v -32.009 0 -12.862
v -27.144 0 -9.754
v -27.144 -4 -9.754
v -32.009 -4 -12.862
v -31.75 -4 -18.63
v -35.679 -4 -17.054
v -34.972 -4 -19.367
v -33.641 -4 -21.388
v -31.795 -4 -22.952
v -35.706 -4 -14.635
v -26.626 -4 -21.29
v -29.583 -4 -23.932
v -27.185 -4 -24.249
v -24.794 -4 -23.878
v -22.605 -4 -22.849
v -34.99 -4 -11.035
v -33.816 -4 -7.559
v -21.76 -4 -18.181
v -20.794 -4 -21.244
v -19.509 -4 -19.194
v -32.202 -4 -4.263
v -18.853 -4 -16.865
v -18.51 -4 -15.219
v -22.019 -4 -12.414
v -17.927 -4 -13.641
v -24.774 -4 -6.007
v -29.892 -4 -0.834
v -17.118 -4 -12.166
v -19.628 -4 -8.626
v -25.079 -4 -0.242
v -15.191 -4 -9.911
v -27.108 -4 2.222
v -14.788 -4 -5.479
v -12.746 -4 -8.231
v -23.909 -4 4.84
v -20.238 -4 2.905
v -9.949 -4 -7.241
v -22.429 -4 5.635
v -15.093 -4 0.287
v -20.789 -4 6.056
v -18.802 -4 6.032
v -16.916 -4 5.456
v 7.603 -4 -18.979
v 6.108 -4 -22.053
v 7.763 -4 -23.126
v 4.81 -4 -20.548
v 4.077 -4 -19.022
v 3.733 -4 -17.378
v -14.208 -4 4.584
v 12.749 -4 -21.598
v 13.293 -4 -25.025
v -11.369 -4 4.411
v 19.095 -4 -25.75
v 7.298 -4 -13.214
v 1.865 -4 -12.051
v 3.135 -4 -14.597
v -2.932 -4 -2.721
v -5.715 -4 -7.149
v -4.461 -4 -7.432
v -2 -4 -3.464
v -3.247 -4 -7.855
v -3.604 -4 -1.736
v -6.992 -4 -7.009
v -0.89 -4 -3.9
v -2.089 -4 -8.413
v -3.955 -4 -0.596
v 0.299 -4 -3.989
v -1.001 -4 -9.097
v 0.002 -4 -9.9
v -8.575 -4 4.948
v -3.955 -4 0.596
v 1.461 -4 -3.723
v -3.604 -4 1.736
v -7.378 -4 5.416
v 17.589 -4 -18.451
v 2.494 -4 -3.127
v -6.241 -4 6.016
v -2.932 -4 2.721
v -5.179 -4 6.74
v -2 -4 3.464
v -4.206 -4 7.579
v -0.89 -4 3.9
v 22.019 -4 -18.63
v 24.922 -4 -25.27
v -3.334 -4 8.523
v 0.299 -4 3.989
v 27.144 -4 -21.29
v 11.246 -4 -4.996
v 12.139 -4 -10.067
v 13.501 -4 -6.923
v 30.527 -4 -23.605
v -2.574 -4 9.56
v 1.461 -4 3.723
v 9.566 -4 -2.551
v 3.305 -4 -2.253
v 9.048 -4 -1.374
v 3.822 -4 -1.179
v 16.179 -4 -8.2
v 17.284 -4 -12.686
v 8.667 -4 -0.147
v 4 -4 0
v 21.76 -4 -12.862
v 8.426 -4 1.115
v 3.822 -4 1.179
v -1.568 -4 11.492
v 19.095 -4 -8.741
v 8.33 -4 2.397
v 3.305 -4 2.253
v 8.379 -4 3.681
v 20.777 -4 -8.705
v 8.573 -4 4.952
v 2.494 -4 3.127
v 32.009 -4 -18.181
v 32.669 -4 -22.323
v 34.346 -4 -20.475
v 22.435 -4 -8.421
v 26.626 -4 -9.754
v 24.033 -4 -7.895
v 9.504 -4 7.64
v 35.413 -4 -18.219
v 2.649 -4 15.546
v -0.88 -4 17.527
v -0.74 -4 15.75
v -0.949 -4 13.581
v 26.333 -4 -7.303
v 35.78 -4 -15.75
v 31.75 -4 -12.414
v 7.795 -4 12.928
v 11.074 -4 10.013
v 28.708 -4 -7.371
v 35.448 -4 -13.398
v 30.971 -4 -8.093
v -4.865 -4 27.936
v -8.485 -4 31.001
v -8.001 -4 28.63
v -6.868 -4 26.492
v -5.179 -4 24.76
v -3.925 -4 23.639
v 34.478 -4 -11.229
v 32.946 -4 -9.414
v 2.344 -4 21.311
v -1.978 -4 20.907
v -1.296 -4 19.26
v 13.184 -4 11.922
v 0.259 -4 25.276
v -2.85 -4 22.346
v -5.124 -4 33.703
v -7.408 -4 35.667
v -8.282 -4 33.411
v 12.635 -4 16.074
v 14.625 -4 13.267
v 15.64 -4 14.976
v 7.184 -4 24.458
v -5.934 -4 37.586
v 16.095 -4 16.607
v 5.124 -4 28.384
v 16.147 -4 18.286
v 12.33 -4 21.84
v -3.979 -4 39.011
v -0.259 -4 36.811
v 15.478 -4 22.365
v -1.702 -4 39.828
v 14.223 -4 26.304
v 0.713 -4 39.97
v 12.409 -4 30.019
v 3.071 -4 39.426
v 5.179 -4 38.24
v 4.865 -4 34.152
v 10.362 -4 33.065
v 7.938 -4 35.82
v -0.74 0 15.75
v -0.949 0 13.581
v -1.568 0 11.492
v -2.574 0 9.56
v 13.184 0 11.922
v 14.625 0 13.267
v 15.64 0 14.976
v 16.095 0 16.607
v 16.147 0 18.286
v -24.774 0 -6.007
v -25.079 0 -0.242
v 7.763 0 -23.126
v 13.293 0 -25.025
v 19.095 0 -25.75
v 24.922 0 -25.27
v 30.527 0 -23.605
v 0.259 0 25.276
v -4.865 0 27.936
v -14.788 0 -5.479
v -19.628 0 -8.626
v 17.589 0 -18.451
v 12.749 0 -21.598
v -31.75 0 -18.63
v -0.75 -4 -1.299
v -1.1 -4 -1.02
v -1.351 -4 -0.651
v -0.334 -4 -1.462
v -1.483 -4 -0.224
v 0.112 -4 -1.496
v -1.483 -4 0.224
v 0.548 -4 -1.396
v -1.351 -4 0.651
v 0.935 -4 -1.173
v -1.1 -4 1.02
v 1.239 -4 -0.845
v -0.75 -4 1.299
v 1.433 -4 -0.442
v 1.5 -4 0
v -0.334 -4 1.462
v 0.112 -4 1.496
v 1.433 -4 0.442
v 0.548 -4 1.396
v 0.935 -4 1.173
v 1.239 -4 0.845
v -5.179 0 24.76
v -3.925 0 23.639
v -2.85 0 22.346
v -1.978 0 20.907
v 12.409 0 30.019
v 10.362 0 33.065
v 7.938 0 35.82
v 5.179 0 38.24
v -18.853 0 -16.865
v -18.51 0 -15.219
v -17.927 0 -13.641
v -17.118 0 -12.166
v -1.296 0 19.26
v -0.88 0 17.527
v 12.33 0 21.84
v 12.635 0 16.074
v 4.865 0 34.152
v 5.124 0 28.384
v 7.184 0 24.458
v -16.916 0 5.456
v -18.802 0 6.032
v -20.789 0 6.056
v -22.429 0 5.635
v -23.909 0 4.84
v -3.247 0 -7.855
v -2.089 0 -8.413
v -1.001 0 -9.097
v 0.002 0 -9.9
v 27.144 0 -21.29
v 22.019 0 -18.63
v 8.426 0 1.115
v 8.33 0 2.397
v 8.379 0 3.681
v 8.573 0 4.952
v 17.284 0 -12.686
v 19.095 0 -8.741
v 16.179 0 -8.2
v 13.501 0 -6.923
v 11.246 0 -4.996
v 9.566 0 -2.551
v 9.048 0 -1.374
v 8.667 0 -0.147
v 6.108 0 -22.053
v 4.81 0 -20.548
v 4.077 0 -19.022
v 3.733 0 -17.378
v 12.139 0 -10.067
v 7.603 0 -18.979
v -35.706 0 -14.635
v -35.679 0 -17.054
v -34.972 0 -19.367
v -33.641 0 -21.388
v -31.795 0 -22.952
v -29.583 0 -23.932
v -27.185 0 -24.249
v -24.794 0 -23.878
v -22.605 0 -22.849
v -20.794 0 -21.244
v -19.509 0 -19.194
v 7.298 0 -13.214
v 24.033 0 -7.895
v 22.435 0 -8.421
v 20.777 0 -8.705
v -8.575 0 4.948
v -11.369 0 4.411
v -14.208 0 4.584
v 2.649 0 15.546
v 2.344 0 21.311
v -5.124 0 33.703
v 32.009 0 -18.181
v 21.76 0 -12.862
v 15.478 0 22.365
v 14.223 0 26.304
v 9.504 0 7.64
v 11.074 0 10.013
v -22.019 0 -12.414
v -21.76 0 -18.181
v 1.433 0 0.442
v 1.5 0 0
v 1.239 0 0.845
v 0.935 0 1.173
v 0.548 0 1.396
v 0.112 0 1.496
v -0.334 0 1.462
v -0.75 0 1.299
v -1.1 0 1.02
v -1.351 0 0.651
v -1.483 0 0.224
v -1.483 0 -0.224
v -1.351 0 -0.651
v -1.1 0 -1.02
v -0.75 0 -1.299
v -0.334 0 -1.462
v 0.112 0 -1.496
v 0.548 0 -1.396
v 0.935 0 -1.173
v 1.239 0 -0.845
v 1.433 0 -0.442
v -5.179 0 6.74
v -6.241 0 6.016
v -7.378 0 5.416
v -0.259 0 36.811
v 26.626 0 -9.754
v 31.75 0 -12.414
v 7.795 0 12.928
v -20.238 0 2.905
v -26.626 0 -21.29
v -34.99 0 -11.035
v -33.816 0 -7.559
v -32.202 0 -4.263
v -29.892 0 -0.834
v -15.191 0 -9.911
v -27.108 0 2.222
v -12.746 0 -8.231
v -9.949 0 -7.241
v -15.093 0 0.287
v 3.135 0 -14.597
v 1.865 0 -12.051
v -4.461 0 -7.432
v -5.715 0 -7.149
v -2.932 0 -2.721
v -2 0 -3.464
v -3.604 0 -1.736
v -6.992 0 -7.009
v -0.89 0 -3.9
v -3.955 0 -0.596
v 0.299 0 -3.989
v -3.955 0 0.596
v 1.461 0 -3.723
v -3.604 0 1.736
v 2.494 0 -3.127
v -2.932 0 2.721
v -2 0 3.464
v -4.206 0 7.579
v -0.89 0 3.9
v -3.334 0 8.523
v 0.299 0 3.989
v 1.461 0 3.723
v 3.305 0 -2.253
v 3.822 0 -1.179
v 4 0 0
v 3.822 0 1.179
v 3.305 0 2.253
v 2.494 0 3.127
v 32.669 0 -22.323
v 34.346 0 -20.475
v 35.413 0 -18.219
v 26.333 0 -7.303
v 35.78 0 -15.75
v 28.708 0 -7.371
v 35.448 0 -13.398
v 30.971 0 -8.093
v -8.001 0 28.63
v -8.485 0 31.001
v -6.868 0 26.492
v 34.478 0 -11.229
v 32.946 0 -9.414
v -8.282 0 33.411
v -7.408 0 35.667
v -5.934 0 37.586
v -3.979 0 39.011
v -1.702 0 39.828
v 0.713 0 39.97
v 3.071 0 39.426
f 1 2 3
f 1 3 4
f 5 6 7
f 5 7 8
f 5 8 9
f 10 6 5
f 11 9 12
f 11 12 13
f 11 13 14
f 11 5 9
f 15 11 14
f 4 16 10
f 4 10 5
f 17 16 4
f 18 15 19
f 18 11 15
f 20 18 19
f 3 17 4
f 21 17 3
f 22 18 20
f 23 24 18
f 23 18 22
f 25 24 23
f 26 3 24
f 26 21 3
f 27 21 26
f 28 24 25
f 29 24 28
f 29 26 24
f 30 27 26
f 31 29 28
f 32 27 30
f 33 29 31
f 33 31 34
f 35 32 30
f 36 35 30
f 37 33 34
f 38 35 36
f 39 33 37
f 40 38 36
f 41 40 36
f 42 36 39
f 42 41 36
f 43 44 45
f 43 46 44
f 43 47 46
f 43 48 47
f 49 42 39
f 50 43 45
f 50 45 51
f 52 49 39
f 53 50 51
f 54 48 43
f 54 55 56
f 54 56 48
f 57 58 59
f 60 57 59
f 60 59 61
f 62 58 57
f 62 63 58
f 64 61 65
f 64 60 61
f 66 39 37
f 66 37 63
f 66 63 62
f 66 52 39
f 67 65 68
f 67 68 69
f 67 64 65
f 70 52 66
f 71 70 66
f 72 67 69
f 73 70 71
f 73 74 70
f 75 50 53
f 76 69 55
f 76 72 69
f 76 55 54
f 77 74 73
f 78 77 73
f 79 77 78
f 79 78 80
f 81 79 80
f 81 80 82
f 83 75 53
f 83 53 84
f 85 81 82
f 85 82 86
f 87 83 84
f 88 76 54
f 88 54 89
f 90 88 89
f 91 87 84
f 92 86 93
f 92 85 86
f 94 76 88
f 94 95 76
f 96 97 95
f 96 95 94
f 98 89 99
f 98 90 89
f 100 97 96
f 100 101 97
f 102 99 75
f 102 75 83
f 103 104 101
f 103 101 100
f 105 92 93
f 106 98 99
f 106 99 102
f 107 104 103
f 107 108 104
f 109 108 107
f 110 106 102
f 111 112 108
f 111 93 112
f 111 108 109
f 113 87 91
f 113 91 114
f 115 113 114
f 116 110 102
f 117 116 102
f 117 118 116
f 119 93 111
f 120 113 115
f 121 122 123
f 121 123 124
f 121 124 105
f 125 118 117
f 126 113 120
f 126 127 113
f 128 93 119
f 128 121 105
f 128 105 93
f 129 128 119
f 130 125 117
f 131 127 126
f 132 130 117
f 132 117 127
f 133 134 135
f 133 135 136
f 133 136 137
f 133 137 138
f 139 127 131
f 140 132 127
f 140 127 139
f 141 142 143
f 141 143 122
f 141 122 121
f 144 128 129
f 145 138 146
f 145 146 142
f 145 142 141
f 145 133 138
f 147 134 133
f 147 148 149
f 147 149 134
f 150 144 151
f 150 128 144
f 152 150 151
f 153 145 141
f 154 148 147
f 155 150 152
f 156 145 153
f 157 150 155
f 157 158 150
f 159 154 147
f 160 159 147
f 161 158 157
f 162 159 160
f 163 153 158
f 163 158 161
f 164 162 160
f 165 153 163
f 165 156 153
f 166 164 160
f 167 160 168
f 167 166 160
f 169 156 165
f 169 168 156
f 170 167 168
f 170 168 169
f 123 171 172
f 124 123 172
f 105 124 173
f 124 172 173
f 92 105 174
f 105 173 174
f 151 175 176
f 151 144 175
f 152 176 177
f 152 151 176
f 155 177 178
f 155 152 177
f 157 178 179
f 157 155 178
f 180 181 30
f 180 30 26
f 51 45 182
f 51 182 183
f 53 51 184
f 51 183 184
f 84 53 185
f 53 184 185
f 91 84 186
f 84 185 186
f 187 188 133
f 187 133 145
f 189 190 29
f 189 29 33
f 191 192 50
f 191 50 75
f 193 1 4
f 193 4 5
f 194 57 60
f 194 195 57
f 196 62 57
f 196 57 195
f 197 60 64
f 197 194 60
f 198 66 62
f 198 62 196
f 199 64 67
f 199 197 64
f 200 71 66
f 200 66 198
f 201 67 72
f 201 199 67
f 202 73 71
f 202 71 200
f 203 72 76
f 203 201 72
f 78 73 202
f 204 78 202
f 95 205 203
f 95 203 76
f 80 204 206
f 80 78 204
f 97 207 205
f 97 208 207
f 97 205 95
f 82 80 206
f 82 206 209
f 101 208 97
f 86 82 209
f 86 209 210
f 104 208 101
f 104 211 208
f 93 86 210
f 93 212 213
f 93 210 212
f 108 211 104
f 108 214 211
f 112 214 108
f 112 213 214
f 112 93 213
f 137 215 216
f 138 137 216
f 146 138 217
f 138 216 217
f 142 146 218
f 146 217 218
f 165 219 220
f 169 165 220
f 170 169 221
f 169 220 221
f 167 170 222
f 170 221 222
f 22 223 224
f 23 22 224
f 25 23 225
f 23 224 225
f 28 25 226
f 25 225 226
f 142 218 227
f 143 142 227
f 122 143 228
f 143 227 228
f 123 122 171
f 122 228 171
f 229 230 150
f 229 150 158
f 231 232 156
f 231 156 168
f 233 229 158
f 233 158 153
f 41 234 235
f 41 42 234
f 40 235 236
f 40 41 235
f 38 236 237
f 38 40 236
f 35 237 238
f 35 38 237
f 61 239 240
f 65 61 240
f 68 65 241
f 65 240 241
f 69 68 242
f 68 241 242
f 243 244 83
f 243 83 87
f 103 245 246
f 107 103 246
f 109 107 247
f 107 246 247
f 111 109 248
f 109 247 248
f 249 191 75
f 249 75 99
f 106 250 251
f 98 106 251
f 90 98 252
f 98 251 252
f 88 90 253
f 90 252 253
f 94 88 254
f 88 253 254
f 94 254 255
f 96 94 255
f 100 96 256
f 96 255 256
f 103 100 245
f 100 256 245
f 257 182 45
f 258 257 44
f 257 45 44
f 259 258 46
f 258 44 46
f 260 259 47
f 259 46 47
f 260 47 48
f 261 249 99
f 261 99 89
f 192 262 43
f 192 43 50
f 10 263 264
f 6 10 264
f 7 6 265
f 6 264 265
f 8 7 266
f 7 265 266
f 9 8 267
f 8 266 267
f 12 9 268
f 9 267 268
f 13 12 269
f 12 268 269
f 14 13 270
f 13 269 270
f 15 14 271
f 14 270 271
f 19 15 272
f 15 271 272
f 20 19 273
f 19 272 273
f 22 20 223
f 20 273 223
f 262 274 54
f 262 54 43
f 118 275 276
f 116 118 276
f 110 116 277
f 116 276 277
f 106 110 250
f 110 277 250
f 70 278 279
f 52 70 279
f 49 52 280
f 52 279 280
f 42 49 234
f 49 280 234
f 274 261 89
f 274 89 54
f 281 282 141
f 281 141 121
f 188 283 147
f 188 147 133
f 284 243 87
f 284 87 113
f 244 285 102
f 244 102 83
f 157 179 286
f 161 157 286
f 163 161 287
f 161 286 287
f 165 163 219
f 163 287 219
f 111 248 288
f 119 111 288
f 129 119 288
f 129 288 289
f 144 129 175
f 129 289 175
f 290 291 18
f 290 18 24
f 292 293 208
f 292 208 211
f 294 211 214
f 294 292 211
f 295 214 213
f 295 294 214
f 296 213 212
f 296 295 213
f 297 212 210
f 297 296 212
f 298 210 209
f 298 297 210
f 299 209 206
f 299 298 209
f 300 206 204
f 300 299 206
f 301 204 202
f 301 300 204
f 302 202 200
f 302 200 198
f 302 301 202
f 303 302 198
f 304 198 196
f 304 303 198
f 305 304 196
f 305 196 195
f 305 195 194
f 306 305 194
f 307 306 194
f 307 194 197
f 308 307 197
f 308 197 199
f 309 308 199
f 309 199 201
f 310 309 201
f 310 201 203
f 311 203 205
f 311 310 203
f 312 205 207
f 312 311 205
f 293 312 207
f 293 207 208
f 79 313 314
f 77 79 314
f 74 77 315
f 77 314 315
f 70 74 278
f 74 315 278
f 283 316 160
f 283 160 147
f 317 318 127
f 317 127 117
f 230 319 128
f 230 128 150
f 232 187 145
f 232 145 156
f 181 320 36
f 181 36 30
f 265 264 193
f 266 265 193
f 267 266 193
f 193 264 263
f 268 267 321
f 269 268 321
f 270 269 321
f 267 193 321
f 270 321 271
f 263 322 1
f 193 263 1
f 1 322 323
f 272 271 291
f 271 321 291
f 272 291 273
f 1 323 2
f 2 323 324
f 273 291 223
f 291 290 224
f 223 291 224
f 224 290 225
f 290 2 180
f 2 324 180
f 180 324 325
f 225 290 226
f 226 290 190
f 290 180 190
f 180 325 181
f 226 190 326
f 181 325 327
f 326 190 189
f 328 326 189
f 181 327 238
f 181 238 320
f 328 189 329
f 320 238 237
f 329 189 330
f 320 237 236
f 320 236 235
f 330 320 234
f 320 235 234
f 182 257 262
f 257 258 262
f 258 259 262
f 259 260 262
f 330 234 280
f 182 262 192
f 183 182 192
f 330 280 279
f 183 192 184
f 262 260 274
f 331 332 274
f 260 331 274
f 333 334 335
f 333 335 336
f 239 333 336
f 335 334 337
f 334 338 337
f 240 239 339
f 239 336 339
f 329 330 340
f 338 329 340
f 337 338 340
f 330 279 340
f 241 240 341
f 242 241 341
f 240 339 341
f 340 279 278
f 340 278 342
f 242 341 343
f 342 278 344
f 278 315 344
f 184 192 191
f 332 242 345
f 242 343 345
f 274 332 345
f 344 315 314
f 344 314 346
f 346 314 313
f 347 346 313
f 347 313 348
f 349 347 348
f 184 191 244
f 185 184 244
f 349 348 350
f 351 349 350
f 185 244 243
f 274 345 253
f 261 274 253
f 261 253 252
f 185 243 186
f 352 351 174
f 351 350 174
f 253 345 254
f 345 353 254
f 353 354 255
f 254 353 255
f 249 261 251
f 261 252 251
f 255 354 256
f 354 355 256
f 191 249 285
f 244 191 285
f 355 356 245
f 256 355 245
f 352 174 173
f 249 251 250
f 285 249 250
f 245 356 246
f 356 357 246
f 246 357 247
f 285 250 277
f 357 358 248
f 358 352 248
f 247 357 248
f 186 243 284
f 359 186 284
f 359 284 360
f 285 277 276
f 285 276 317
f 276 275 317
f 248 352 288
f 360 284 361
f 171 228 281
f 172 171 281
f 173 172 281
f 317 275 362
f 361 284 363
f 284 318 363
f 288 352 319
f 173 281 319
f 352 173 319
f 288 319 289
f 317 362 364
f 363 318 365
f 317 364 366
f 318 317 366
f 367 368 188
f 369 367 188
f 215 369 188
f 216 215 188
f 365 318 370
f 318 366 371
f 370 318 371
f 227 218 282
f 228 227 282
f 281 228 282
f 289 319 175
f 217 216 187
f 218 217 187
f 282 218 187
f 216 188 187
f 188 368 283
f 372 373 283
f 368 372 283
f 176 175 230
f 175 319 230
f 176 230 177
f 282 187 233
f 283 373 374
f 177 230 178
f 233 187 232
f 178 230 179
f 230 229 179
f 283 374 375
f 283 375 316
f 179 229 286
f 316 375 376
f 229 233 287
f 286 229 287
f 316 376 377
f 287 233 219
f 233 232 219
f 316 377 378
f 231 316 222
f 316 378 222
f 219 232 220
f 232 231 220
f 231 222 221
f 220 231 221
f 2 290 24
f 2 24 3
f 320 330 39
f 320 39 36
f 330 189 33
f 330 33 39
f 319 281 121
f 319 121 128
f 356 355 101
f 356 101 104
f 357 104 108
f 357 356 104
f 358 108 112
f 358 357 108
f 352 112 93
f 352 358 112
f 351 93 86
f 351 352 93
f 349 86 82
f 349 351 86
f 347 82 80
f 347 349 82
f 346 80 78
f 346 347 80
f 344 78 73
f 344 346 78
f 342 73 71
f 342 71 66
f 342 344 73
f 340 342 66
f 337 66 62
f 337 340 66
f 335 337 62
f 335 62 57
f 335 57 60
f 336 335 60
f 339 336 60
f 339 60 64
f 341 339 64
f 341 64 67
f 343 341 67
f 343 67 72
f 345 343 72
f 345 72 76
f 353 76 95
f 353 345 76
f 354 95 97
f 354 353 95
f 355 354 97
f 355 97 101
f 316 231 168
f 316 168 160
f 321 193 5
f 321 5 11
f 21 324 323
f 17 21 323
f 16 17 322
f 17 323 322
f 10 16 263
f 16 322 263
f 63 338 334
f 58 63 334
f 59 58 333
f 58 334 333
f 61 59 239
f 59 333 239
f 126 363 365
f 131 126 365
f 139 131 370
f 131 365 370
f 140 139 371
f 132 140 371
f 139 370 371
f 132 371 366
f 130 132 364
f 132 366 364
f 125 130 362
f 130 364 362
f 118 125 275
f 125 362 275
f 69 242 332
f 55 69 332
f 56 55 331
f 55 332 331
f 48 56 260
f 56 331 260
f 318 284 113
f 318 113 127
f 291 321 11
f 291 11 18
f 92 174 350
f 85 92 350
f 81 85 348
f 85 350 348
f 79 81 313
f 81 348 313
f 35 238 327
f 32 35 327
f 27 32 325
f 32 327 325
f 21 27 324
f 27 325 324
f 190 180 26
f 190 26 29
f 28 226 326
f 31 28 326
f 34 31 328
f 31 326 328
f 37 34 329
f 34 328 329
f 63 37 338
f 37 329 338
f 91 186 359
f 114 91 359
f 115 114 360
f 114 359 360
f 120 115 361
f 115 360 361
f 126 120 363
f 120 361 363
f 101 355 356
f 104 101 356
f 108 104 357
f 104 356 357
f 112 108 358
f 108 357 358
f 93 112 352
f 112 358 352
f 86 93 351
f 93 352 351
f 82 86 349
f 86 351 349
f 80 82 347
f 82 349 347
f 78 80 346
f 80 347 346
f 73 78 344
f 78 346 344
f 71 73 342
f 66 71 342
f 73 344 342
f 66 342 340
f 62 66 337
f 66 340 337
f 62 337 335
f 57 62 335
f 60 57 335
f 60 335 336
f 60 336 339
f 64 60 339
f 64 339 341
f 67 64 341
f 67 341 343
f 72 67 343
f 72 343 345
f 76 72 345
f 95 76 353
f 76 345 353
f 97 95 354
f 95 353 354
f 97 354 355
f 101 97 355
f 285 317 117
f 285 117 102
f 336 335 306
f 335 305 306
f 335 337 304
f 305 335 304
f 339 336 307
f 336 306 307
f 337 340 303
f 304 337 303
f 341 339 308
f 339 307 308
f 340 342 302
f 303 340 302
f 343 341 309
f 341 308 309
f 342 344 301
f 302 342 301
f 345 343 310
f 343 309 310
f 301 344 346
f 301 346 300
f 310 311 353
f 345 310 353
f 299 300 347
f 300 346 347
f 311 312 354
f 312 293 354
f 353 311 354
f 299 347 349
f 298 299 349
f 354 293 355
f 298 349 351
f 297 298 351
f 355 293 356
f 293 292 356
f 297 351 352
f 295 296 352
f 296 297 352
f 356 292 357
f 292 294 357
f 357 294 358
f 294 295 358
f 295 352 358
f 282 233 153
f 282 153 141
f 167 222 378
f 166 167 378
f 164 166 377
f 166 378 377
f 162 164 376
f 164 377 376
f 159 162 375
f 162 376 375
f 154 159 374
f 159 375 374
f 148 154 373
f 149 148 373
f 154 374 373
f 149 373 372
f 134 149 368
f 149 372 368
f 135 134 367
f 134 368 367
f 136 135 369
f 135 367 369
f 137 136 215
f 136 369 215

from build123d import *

# Parameters (mm, degrees)
F0_R     = 4
F0_R_2   = 1.5
F1_DEPTH = 4
F2_DEPTH = 4
F3_R     = 7
F5_DEPTH = 5


with BuildPart() as f1:
    # F0 (on Front) → F1 (new body)
    with BuildSketch(Plane.XZ):
        Circle(F0_R)
        Circle(F0_R_2, mode=Mode.SUBTRACT)
    extrude(amount=F1_DEPTH)


with BuildPart() as f2:
    # F0 (on Front) → F2 (new body)
    with BuildSketch(Plane.XZ):
        with BuildLine():
            ThreePointArc((8.4264950876, 1.1154284105), (8.3364947708, 3.0398975998), (8.5728969157, 4.9519111309))
            ThreePointArc((8.5728969157, 4.9519111309), (5.9879137453, 6.5463658555), (3.2472592539, 7.855272582))
            ThreePointArc((3.2472592539, 7.855272582), (6.7398449515, 5.179236433), (8.4264950876, 1.1154284105))
        make_face()
        with BuildLine():
            ThreePointArc((3.2472592539, 7.855272582), (0.3823579471, 8.8636231205), (-2.5739390259, 9.5598547723))
            ThreePointArc((-2.5739390259, 9.5598547723), (-3.7566267506, 8.03902216), (-5.1792369207, 6.7398445768))
            ThreePointArc((-5.1792369207, 6.7398445768), (-1.1154278708, 8.426495159), (3.2472592539, 7.855272582))
        make_face()
        with BuildLine():
            ThreePointArc((-5.1792369207, 6.7398445768), (-6.8008759525, 5.6996674391), (-8.5749292945, 4.9483909476))
            ThreePointArc((-8.5749292945, 4.9483909476), (-8.6632759945, 1.9125020225), (-8.4264951136, -1.1154282143))
            ThreePointArc((-8.4264951136, -1.1154282143), (-7.8552729871, 3.2472582739), (-5.1792369207, 6.7398445768))
        make_face()
        with BuildLine():
            ThreePointArc((-3.2472582285, -7.8552730059), (-6.7398446738, -5.1792367945), (-8.4264951136, -1.1154282143))
            ThreePointArc((-8.4264951136, -1.1154282143), (-7.8673016546, -4.1006803203), (-6.9921075763, -7.0090239704))
            ThreePointArc((-6.9921075763, -7.0090239704), (-5.0836840726, -7.2728452704), (-3.2472582285, -7.8552730059))
        make_face()
        with BuildLine():
            ThreePointArc((5.1792370288, -6.7398444937), (1.1154284884, -8.4264950773), (-3.2472582285, -7.8552730059))
            ThreePointArc((-3.2472582285, -7.8552730059), (-1.5356188502, -8.7395650429), (0.0020323788, -9.9003020785))
            ThreePointArc((0.0020323788, -9.9003020785), (2.6753628237, -8.4588680032), (5.1792370288, -6.7398444937))
        make_face()
        with BuildLine():
            ThreePointArc((5.1792370288, -6.7398444937), (7.4849442954, -4.7629428002), (9.5660466022, -2.5508308019))
            ThreePointArc((9.5660466022, -2.5508308019), (8.8403107944, -0.7661769039), (8.4264950876, 1.1154284105))
            ThreePointArc((8.4264950876, 1.1154284105), (8.481603865, 0.5589238569), (8.5, 0))
            ThreePointArc((8.5, 0), (7.6247463809, -3.7567595914), (5.1792370288, -6.7398444937))
        make_face()
        with BuildLine():
            ThreePointArc((12.4094616626, 30.0190809707), (10.130341663, 29.3097215933), (7.9189370673, 28.4112404231))
            ThreePointArc((7.9189370673, 28.4112404231), (4.7869347023, 24.4760939531), (-0.0209795681, 23.0000258908))
            ThreePointArc((-0.0209795681, 23.0000258908), (-1.0257749344, 21.9784434837), (-1.9776939863, 20.9074185254))
            ThreePointArc((-1.9776939863, 20.9074185254), (-1.0536641236, 18.4019405846), (-0.7398775171, 15.75))
            ThreePointArc((-0.7398775171, 15.75), (-1.2080368697, 12.5219324837), (-2.5739390259, 9.5598547723))
            ThreePointArc((-2.5739390259, 9.5598547723), (0.3823579471, 8.8636231205), (3.2472592539, 7.855272582))
            ThreePointArc((3.2472592539, 7.855272582), (5.9879137453, 6.5463658555), (8.5728969157, 4.9519111309))
            ThreePointArc((8.5728969157, 4.9519111309), (11.2351619583, 10.1969727182), (16.1632819104, 13.4081967759))
            ThreePointArc((16.1632819104, 13.4081967759), (16.2359019984, 14.5780976537), (16.2601224829, 15.75))
            ThreePointArc((16.2601224829, 15.75), (15.2805413698, 23.1397608301), (12.4094616626, 30.0190809707))
        make_face()
        with BuildLine():
            ThreePointArc((-0.0209795681, 23.0000258908), (4.7869347023, 24.4760939531), (7.9189370673, 28.4112404231))
            ThreePointArc((7.9189370673, 28.4112404231), (3.7181687825, 26.0443023941), (-0.0209795681, 23.0000258908))
        make_face()
        with BuildLine():
            ThreePointArc((7.9189370673, 28.4112404231), (8.3534712866, 29.9285301582), (8.5, 31.5))
            ThreePointArc((8.5, 31.5), (7.6247462922, 35.2567597714), (5.1792367107, 38.2398447382))
            ThreePointArc((5.1792367107, 38.2398447382), (-6.7398446866, 36.6792367779), (-5.1792368451, 24.7601553651))
            ThreePointArc((-5.1792368451, 24.7601553651), (-2.7450094039, 23.4554413811), (-0.0209795681, 23.0000258908))
            ThreePointArc((-0.0209795681, 23.0000258908), (3.7181687825, 26.0443023941), (7.9189370673, 28.4112404231))
        make_face()
        with BuildLine():
            ThreePointArc((5.1792367107, 38.2398447382), (7.6247462922, 35.2567597714), (8.5, 31.5))
            ThreePointArc((8.5, 31.5), (8.3534712866, 29.9285301582), (7.9189370673, 28.4112404231))
            ThreePointArc((7.9189370673, 28.4112404231), (10.130341663, 29.3097215933), (12.4094616626, 30.0190809707))
            ThreePointArc((12.4094616626, 30.0190809707), (9.1947549566, 34.4816228083), (5.1792367107, 38.2398447382))
        make_face()
        with BuildLine():
            ThreePointArc((-0.0209795681, 23.0000258908), (-2.7450094039, 23.4554413811), (-5.1792368451, 24.7601553651))
            ThreePointArc((-5.1792368451, 24.7601553651), (-3.3635180741, 23.0124036417), (-1.9776939863, 20.9074185254))
            ThreePointArc((-1.9776939863, 20.9074185254), (-1.0257749344, 21.9784434837), (-0.0209795681, 23.0000258908))
        make_face()
        with BuildLine():
            ThreePointArc((20.6453874258, -21.0636208828), (25.1624433763, -23.9820592806), (30.5270597502, -23.6052724675))
            ThreePointArc((30.5270597502, -23.6052724675), (34.3456231017, -20.4748435946), (35.7798002192, -15.75))
            ThreePointArc((35.7798002192, -15.75), (32.0046443813, -8.684177497), (24.03254195, -7.8947270109))
            ThreePointArc((24.03254195, -7.8947270109), (21.6855127867, -9.3504728204), (19.9290964931, -11.4818441065))
            ThreePointArc((19.9290964931, -11.4818441065), (20.5626287043, -14.8933008483), (20.7748648544, -18.3565877235))
            ThreePointArc((20.7748648544, -18.3565877235), (20.7424770055, -19.7116516454), (20.6453874258, -21.0636208828))
        make_face()
        with BuildLine():
            ThreePointArc((19.9290964931, -11.4818441065), (18.8034517976, -16.383654035), (20.6453874258, -21.0636208828))
            ThreePointArc((20.6453874258, -21.0636208828), (20.7424770055, -19.7116516454), (20.7748648544, -18.3565877235))
            ThreePointArc((20.7748648544, -18.3565877235), (20.5626287043, -14.8933008483), (19.9290964931, -11.4818441065))
        make_face()
        with BuildLine():
            ThreePointArc((24.03254195, -7.8947270109), (21.611085182, -8.5933097245), (19.0952025637, -8.7409760296))
            ThreePointArc((19.0952025637, -8.7409760296), (19.5467778597, -10.1008745901), (19.9290964931, -11.4818441065))
            ThreePointArc((19.9290964931, -11.4818441065), (21.6855127867, -9.3504728204), (24.03254195, -7.8947270109))
        make_face()
        with BuildLine():
            ThreePointArc((3.5301980717, -20.7019111309), (11.2730674839, -24.4785185424), (19.7925558876, -25.7564495325))
            ThreePointArc((19.7925558876, -25.7564495325), (20.3177926461, -23.4279940258), (20.6453874258, -21.0636208828))
            ThreePointArc((20.6453874258, -21.0636208828), (18.8034517976, -16.383654035), (19.9290964931, -11.4818441065))
            ThreePointArc((19.9290964931, -11.4818441065), (19.5467778597, -10.1008745901), (19.0952025637, -8.7409760296))
            ThreePointArc((19.0952025637, -8.7409760296), (13.5013023755, -6.9225682379), (9.5660466022, -2.5508308019))
            ThreePointArc((9.5660466022, -2.5508308019), (7.4849442954, -4.7629428002), (5.1792370288, -6.7398444937))
            ThreePointArc((5.1792370288, -6.7398444937), (2.6753628237, -8.4588680032), (0.0020323788, -9.9003020785))
            ThreePointArc((0.0020323788, -9.9003020785), (2.7888798344, -13.7267110567), (3.7748648544, -18.3565877235))
            ThreePointArc((3.7748648544, -18.3565877235), (3.7135326404, -19.5356131388), (3.5301980717, -20.7019111309))
        make_face()
        with BuildLine():
            ThreePointArc((19.7925558876, -25.7564495325), (25.2645844345, -25.2037026585), (30.5270597502, -23.6052724675))
            ThreePointArc((30.5270597502, -23.6052724675), (25.1624433763, -23.9820592806), (20.6453874258, -21.0636208828))
            ThreePointArc((20.6453874258, -21.0636208828), (20.3177926461, -23.4279940258), (19.7925558876, -25.7564495325))
        make_face()
        with BuildLine():
            ThreePointArc((-19.9081169251, -11.5181817843), (-24.4141118884, -9.8021225759), (-28.5643244931, -7.3476195403))
            ThreePointArc((-28.5643244931, -7.3476195403), (-33.350293716, -9.8002849895), (-35.7062952911, -14.6345714711))
            ThreePointArc((-35.7062952911, -14.6345714711), (-28.3952286751, -24.1764950816), (-18.853305128, -16.8654283828))
            ThreePointArc((-18.853305128, -16.8654283828), (-18.7981963533, -16.3089238429), (-18.7798002192, -15.75))
            ThreePointArc((-18.7798002192, -15.75), (-19.0667219899, -13.5601721529), (-19.9081169251, -11.5181817843))
        make_face()
        with BuildLine():
            ThreePointArc((-28.5643244931, -7.3476195403), (-30.4481343091, -5.8817275674), (-32.2020175502, -4.2626314382))
            ThreePointArc((-32.2020175502, -4.2626314382), (-34.45933874, -9.2779198704), (-35.7062952911, -14.6345714711))
            ThreePointArc((-35.7062952911, -14.6345714711), (-33.350293716, -9.8002849895), (-28.5643244931, -7.3476195403))
        make_face()
        with BuildLine():
            ThreePointArc((-19.6934799821, 7.293714355), (-26.8355526467, 2.4764964516), (-32.2020175502, -4.2626314382))
            ThreePointArc((-32.2020175502, -4.2626314382), (-30.4481343091, -5.8817275674), (-28.5643244931, -7.3476195403))
            ThreePointArc((-28.5643244931, -7.3476195403), (-23.5903864999, -8.0924399181), (-19.9081169251, -11.5181817843))
            ThreePointArc((-19.9081169251, -11.5181817843), (-18.5210029253, -11.8775688936), (-17.1175085773, -12.1664424957))
            ThreePointArc((-17.1175085773, -12.1664424957), (-12.7457711413, -8.2311867224), (-6.9921075763, -7.0090239704))
            ThreePointArc((-6.9921075763, -7.0090239704), (-7.8673016546, -4.1006803203), (-8.4264951136, -1.1154282143))
            ThreePointArc((-8.4264951136, -1.1154282143), (-8.6632759945, 1.9125020225), (-8.5749292945, 4.9483909476))
            ThreePointArc((-8.5749292945, 4.9483909476), (-14.4484183948, 4.6314493124), (-19.6934799821, 7.293714355))
        make_face()
        with BuildLine():
            ThreePointArc((-19.9081169251, -11.5181817843), (-23.5903864999, -8.0924399181), (-28.5643244931, -7.3476195403))
            ThreePointArc((-28.5643244931, -7.3476195403), (-24.4141118884, -9.8021225759), (-19.9081169251, -11.5181817843))
        make_face()
        with BuildLine():
            ThreePointArc((-17.1175085773, -12.1664424957), (-18.5210029253, -11.8775688936), (-19.9081169251, -11.5181817843))
            ThreePointArc((-19.9081169251, -11.5181817843), (-19.0667219899, -13.5601721529), (-18.7798002192, -15.75))
            ThreePointArc((-18.7798002192, -15.75), (-18.7981963533, -16.3089238429), (-18.853305128, -16.8654283828))
            ThreePointArc((-18.853305128, -16.8654283828), (-18.2475671223, -14.4190939286), (-17.1175085773, -12.1664424957))
        make_face()
        with BuildLine():
            ThreePointArc((3.2472592539, 7.855272582), (-1.1154278708, 8.426495159), (-5.1792369207, 6.7398445768))
            ThreePointArc((-5.1792369207, 6.7398445768), (-7.8552729871, 3.2472582739), (-8.4264951136, -1.1154282143))
            ThreePointArc((-8.4264951136, -1.1154282143), (-6.7398446738, -5.1792367945), (-3.2472582285, -7.8552730059))
            ThreePointArc((-3.2472582285, -7.8552730059), (1.1154284884, -8.4264950773), (5.1792370288, -6.7398444937))
            ThreePointArc((5.1792370288, -6.7398444937), (7.6247463809, -3.7567595914), (8.5, 0))
            ThreePointArc((8.5, 0), (8.481603865, 0.5589238569), (8.4264950876, 1.1154284105))
            ThreePointArc((8.4264950876, 1.1154284105), (6.7398449515, 5.179236433), (3.2472592539, 7.855272582))
        make_face()
        Circle(F0_R, mode=Mode.SUBTRACT)
    extrude(amount=F2_DEPTH)

    # F3
    f3_edges = [f2.edges().sort_by_distance(p)[0] for p in [
        (16.163282, -2, 13.408197),
        (-19.69348, -2, 7.293714),
        (3.530198, -2, -20.701911),
    ]]
    fillet(f3_edges, radius=F3_R)

    # F4 (on Front) → F5 (cut)
    with BuildSketch(Plane.XZ):
        Polygon((0.2589552739, 25.2760980245), (5.1244457674, 28.3842060648), (4.8654904936, 34.1518984543), (-0.2589552739, 36.8114828034), (-5.1244457674, 33.7033747631), (-4.8654904936, 27.9356823736), align=None)
        Polygon((7.1844218157, 24.4583874775), (2.3439410107, 21.3114717), (2.6490096151, 15.5460344677), (7.7945590244, 12.9275130128), (12.6350398293, 16.0744287902), (12.329971225, 21.8398660226), align=None)
        Polygon((27.1436664021, -21.2895875964), (32.0091568957, -18.1814795561), (31.7502016218, -12.4137871666), (26.6257558544, -9.7542028175), (21.7602653608, -12.8623108579), (22.0192206347, -18.6300032473), align=None)
        Polygon((17.5893739832, -18.4510855426), (17.2843053789, -12.6856483103), (12.1387559696, -10.0671268554), (7.2982751646, -13.2140426328), (7.603343769, -18.9794798652), (12.7488931783, -21.59800132), align=None)
        Polygon((-15.092834189, 0.28652962), (-20.2383835983, 2.9050510749), (-25.0788644033, -0.2418647025), (-24.7737957989, -6.0073019349), (-19.6282463896, -8.6258233897), (-14.7877655847, -5.4789076123), align=None)
        Polygon((-32.0091568957, -12.8623108579), (-31.7502016218, -18.6300032473), (-26.6257558544, -21.2895875964), (-21.7602653608, -18.1814795561), (-22.0192206347, -12.4137871666), (-27.1436664021, -9.7542028175), align=None)
    extrude(amount=F5_DEPTH, mode=Mode.SUBTRACT)


solid = Compound([f1.part, f2.part])
